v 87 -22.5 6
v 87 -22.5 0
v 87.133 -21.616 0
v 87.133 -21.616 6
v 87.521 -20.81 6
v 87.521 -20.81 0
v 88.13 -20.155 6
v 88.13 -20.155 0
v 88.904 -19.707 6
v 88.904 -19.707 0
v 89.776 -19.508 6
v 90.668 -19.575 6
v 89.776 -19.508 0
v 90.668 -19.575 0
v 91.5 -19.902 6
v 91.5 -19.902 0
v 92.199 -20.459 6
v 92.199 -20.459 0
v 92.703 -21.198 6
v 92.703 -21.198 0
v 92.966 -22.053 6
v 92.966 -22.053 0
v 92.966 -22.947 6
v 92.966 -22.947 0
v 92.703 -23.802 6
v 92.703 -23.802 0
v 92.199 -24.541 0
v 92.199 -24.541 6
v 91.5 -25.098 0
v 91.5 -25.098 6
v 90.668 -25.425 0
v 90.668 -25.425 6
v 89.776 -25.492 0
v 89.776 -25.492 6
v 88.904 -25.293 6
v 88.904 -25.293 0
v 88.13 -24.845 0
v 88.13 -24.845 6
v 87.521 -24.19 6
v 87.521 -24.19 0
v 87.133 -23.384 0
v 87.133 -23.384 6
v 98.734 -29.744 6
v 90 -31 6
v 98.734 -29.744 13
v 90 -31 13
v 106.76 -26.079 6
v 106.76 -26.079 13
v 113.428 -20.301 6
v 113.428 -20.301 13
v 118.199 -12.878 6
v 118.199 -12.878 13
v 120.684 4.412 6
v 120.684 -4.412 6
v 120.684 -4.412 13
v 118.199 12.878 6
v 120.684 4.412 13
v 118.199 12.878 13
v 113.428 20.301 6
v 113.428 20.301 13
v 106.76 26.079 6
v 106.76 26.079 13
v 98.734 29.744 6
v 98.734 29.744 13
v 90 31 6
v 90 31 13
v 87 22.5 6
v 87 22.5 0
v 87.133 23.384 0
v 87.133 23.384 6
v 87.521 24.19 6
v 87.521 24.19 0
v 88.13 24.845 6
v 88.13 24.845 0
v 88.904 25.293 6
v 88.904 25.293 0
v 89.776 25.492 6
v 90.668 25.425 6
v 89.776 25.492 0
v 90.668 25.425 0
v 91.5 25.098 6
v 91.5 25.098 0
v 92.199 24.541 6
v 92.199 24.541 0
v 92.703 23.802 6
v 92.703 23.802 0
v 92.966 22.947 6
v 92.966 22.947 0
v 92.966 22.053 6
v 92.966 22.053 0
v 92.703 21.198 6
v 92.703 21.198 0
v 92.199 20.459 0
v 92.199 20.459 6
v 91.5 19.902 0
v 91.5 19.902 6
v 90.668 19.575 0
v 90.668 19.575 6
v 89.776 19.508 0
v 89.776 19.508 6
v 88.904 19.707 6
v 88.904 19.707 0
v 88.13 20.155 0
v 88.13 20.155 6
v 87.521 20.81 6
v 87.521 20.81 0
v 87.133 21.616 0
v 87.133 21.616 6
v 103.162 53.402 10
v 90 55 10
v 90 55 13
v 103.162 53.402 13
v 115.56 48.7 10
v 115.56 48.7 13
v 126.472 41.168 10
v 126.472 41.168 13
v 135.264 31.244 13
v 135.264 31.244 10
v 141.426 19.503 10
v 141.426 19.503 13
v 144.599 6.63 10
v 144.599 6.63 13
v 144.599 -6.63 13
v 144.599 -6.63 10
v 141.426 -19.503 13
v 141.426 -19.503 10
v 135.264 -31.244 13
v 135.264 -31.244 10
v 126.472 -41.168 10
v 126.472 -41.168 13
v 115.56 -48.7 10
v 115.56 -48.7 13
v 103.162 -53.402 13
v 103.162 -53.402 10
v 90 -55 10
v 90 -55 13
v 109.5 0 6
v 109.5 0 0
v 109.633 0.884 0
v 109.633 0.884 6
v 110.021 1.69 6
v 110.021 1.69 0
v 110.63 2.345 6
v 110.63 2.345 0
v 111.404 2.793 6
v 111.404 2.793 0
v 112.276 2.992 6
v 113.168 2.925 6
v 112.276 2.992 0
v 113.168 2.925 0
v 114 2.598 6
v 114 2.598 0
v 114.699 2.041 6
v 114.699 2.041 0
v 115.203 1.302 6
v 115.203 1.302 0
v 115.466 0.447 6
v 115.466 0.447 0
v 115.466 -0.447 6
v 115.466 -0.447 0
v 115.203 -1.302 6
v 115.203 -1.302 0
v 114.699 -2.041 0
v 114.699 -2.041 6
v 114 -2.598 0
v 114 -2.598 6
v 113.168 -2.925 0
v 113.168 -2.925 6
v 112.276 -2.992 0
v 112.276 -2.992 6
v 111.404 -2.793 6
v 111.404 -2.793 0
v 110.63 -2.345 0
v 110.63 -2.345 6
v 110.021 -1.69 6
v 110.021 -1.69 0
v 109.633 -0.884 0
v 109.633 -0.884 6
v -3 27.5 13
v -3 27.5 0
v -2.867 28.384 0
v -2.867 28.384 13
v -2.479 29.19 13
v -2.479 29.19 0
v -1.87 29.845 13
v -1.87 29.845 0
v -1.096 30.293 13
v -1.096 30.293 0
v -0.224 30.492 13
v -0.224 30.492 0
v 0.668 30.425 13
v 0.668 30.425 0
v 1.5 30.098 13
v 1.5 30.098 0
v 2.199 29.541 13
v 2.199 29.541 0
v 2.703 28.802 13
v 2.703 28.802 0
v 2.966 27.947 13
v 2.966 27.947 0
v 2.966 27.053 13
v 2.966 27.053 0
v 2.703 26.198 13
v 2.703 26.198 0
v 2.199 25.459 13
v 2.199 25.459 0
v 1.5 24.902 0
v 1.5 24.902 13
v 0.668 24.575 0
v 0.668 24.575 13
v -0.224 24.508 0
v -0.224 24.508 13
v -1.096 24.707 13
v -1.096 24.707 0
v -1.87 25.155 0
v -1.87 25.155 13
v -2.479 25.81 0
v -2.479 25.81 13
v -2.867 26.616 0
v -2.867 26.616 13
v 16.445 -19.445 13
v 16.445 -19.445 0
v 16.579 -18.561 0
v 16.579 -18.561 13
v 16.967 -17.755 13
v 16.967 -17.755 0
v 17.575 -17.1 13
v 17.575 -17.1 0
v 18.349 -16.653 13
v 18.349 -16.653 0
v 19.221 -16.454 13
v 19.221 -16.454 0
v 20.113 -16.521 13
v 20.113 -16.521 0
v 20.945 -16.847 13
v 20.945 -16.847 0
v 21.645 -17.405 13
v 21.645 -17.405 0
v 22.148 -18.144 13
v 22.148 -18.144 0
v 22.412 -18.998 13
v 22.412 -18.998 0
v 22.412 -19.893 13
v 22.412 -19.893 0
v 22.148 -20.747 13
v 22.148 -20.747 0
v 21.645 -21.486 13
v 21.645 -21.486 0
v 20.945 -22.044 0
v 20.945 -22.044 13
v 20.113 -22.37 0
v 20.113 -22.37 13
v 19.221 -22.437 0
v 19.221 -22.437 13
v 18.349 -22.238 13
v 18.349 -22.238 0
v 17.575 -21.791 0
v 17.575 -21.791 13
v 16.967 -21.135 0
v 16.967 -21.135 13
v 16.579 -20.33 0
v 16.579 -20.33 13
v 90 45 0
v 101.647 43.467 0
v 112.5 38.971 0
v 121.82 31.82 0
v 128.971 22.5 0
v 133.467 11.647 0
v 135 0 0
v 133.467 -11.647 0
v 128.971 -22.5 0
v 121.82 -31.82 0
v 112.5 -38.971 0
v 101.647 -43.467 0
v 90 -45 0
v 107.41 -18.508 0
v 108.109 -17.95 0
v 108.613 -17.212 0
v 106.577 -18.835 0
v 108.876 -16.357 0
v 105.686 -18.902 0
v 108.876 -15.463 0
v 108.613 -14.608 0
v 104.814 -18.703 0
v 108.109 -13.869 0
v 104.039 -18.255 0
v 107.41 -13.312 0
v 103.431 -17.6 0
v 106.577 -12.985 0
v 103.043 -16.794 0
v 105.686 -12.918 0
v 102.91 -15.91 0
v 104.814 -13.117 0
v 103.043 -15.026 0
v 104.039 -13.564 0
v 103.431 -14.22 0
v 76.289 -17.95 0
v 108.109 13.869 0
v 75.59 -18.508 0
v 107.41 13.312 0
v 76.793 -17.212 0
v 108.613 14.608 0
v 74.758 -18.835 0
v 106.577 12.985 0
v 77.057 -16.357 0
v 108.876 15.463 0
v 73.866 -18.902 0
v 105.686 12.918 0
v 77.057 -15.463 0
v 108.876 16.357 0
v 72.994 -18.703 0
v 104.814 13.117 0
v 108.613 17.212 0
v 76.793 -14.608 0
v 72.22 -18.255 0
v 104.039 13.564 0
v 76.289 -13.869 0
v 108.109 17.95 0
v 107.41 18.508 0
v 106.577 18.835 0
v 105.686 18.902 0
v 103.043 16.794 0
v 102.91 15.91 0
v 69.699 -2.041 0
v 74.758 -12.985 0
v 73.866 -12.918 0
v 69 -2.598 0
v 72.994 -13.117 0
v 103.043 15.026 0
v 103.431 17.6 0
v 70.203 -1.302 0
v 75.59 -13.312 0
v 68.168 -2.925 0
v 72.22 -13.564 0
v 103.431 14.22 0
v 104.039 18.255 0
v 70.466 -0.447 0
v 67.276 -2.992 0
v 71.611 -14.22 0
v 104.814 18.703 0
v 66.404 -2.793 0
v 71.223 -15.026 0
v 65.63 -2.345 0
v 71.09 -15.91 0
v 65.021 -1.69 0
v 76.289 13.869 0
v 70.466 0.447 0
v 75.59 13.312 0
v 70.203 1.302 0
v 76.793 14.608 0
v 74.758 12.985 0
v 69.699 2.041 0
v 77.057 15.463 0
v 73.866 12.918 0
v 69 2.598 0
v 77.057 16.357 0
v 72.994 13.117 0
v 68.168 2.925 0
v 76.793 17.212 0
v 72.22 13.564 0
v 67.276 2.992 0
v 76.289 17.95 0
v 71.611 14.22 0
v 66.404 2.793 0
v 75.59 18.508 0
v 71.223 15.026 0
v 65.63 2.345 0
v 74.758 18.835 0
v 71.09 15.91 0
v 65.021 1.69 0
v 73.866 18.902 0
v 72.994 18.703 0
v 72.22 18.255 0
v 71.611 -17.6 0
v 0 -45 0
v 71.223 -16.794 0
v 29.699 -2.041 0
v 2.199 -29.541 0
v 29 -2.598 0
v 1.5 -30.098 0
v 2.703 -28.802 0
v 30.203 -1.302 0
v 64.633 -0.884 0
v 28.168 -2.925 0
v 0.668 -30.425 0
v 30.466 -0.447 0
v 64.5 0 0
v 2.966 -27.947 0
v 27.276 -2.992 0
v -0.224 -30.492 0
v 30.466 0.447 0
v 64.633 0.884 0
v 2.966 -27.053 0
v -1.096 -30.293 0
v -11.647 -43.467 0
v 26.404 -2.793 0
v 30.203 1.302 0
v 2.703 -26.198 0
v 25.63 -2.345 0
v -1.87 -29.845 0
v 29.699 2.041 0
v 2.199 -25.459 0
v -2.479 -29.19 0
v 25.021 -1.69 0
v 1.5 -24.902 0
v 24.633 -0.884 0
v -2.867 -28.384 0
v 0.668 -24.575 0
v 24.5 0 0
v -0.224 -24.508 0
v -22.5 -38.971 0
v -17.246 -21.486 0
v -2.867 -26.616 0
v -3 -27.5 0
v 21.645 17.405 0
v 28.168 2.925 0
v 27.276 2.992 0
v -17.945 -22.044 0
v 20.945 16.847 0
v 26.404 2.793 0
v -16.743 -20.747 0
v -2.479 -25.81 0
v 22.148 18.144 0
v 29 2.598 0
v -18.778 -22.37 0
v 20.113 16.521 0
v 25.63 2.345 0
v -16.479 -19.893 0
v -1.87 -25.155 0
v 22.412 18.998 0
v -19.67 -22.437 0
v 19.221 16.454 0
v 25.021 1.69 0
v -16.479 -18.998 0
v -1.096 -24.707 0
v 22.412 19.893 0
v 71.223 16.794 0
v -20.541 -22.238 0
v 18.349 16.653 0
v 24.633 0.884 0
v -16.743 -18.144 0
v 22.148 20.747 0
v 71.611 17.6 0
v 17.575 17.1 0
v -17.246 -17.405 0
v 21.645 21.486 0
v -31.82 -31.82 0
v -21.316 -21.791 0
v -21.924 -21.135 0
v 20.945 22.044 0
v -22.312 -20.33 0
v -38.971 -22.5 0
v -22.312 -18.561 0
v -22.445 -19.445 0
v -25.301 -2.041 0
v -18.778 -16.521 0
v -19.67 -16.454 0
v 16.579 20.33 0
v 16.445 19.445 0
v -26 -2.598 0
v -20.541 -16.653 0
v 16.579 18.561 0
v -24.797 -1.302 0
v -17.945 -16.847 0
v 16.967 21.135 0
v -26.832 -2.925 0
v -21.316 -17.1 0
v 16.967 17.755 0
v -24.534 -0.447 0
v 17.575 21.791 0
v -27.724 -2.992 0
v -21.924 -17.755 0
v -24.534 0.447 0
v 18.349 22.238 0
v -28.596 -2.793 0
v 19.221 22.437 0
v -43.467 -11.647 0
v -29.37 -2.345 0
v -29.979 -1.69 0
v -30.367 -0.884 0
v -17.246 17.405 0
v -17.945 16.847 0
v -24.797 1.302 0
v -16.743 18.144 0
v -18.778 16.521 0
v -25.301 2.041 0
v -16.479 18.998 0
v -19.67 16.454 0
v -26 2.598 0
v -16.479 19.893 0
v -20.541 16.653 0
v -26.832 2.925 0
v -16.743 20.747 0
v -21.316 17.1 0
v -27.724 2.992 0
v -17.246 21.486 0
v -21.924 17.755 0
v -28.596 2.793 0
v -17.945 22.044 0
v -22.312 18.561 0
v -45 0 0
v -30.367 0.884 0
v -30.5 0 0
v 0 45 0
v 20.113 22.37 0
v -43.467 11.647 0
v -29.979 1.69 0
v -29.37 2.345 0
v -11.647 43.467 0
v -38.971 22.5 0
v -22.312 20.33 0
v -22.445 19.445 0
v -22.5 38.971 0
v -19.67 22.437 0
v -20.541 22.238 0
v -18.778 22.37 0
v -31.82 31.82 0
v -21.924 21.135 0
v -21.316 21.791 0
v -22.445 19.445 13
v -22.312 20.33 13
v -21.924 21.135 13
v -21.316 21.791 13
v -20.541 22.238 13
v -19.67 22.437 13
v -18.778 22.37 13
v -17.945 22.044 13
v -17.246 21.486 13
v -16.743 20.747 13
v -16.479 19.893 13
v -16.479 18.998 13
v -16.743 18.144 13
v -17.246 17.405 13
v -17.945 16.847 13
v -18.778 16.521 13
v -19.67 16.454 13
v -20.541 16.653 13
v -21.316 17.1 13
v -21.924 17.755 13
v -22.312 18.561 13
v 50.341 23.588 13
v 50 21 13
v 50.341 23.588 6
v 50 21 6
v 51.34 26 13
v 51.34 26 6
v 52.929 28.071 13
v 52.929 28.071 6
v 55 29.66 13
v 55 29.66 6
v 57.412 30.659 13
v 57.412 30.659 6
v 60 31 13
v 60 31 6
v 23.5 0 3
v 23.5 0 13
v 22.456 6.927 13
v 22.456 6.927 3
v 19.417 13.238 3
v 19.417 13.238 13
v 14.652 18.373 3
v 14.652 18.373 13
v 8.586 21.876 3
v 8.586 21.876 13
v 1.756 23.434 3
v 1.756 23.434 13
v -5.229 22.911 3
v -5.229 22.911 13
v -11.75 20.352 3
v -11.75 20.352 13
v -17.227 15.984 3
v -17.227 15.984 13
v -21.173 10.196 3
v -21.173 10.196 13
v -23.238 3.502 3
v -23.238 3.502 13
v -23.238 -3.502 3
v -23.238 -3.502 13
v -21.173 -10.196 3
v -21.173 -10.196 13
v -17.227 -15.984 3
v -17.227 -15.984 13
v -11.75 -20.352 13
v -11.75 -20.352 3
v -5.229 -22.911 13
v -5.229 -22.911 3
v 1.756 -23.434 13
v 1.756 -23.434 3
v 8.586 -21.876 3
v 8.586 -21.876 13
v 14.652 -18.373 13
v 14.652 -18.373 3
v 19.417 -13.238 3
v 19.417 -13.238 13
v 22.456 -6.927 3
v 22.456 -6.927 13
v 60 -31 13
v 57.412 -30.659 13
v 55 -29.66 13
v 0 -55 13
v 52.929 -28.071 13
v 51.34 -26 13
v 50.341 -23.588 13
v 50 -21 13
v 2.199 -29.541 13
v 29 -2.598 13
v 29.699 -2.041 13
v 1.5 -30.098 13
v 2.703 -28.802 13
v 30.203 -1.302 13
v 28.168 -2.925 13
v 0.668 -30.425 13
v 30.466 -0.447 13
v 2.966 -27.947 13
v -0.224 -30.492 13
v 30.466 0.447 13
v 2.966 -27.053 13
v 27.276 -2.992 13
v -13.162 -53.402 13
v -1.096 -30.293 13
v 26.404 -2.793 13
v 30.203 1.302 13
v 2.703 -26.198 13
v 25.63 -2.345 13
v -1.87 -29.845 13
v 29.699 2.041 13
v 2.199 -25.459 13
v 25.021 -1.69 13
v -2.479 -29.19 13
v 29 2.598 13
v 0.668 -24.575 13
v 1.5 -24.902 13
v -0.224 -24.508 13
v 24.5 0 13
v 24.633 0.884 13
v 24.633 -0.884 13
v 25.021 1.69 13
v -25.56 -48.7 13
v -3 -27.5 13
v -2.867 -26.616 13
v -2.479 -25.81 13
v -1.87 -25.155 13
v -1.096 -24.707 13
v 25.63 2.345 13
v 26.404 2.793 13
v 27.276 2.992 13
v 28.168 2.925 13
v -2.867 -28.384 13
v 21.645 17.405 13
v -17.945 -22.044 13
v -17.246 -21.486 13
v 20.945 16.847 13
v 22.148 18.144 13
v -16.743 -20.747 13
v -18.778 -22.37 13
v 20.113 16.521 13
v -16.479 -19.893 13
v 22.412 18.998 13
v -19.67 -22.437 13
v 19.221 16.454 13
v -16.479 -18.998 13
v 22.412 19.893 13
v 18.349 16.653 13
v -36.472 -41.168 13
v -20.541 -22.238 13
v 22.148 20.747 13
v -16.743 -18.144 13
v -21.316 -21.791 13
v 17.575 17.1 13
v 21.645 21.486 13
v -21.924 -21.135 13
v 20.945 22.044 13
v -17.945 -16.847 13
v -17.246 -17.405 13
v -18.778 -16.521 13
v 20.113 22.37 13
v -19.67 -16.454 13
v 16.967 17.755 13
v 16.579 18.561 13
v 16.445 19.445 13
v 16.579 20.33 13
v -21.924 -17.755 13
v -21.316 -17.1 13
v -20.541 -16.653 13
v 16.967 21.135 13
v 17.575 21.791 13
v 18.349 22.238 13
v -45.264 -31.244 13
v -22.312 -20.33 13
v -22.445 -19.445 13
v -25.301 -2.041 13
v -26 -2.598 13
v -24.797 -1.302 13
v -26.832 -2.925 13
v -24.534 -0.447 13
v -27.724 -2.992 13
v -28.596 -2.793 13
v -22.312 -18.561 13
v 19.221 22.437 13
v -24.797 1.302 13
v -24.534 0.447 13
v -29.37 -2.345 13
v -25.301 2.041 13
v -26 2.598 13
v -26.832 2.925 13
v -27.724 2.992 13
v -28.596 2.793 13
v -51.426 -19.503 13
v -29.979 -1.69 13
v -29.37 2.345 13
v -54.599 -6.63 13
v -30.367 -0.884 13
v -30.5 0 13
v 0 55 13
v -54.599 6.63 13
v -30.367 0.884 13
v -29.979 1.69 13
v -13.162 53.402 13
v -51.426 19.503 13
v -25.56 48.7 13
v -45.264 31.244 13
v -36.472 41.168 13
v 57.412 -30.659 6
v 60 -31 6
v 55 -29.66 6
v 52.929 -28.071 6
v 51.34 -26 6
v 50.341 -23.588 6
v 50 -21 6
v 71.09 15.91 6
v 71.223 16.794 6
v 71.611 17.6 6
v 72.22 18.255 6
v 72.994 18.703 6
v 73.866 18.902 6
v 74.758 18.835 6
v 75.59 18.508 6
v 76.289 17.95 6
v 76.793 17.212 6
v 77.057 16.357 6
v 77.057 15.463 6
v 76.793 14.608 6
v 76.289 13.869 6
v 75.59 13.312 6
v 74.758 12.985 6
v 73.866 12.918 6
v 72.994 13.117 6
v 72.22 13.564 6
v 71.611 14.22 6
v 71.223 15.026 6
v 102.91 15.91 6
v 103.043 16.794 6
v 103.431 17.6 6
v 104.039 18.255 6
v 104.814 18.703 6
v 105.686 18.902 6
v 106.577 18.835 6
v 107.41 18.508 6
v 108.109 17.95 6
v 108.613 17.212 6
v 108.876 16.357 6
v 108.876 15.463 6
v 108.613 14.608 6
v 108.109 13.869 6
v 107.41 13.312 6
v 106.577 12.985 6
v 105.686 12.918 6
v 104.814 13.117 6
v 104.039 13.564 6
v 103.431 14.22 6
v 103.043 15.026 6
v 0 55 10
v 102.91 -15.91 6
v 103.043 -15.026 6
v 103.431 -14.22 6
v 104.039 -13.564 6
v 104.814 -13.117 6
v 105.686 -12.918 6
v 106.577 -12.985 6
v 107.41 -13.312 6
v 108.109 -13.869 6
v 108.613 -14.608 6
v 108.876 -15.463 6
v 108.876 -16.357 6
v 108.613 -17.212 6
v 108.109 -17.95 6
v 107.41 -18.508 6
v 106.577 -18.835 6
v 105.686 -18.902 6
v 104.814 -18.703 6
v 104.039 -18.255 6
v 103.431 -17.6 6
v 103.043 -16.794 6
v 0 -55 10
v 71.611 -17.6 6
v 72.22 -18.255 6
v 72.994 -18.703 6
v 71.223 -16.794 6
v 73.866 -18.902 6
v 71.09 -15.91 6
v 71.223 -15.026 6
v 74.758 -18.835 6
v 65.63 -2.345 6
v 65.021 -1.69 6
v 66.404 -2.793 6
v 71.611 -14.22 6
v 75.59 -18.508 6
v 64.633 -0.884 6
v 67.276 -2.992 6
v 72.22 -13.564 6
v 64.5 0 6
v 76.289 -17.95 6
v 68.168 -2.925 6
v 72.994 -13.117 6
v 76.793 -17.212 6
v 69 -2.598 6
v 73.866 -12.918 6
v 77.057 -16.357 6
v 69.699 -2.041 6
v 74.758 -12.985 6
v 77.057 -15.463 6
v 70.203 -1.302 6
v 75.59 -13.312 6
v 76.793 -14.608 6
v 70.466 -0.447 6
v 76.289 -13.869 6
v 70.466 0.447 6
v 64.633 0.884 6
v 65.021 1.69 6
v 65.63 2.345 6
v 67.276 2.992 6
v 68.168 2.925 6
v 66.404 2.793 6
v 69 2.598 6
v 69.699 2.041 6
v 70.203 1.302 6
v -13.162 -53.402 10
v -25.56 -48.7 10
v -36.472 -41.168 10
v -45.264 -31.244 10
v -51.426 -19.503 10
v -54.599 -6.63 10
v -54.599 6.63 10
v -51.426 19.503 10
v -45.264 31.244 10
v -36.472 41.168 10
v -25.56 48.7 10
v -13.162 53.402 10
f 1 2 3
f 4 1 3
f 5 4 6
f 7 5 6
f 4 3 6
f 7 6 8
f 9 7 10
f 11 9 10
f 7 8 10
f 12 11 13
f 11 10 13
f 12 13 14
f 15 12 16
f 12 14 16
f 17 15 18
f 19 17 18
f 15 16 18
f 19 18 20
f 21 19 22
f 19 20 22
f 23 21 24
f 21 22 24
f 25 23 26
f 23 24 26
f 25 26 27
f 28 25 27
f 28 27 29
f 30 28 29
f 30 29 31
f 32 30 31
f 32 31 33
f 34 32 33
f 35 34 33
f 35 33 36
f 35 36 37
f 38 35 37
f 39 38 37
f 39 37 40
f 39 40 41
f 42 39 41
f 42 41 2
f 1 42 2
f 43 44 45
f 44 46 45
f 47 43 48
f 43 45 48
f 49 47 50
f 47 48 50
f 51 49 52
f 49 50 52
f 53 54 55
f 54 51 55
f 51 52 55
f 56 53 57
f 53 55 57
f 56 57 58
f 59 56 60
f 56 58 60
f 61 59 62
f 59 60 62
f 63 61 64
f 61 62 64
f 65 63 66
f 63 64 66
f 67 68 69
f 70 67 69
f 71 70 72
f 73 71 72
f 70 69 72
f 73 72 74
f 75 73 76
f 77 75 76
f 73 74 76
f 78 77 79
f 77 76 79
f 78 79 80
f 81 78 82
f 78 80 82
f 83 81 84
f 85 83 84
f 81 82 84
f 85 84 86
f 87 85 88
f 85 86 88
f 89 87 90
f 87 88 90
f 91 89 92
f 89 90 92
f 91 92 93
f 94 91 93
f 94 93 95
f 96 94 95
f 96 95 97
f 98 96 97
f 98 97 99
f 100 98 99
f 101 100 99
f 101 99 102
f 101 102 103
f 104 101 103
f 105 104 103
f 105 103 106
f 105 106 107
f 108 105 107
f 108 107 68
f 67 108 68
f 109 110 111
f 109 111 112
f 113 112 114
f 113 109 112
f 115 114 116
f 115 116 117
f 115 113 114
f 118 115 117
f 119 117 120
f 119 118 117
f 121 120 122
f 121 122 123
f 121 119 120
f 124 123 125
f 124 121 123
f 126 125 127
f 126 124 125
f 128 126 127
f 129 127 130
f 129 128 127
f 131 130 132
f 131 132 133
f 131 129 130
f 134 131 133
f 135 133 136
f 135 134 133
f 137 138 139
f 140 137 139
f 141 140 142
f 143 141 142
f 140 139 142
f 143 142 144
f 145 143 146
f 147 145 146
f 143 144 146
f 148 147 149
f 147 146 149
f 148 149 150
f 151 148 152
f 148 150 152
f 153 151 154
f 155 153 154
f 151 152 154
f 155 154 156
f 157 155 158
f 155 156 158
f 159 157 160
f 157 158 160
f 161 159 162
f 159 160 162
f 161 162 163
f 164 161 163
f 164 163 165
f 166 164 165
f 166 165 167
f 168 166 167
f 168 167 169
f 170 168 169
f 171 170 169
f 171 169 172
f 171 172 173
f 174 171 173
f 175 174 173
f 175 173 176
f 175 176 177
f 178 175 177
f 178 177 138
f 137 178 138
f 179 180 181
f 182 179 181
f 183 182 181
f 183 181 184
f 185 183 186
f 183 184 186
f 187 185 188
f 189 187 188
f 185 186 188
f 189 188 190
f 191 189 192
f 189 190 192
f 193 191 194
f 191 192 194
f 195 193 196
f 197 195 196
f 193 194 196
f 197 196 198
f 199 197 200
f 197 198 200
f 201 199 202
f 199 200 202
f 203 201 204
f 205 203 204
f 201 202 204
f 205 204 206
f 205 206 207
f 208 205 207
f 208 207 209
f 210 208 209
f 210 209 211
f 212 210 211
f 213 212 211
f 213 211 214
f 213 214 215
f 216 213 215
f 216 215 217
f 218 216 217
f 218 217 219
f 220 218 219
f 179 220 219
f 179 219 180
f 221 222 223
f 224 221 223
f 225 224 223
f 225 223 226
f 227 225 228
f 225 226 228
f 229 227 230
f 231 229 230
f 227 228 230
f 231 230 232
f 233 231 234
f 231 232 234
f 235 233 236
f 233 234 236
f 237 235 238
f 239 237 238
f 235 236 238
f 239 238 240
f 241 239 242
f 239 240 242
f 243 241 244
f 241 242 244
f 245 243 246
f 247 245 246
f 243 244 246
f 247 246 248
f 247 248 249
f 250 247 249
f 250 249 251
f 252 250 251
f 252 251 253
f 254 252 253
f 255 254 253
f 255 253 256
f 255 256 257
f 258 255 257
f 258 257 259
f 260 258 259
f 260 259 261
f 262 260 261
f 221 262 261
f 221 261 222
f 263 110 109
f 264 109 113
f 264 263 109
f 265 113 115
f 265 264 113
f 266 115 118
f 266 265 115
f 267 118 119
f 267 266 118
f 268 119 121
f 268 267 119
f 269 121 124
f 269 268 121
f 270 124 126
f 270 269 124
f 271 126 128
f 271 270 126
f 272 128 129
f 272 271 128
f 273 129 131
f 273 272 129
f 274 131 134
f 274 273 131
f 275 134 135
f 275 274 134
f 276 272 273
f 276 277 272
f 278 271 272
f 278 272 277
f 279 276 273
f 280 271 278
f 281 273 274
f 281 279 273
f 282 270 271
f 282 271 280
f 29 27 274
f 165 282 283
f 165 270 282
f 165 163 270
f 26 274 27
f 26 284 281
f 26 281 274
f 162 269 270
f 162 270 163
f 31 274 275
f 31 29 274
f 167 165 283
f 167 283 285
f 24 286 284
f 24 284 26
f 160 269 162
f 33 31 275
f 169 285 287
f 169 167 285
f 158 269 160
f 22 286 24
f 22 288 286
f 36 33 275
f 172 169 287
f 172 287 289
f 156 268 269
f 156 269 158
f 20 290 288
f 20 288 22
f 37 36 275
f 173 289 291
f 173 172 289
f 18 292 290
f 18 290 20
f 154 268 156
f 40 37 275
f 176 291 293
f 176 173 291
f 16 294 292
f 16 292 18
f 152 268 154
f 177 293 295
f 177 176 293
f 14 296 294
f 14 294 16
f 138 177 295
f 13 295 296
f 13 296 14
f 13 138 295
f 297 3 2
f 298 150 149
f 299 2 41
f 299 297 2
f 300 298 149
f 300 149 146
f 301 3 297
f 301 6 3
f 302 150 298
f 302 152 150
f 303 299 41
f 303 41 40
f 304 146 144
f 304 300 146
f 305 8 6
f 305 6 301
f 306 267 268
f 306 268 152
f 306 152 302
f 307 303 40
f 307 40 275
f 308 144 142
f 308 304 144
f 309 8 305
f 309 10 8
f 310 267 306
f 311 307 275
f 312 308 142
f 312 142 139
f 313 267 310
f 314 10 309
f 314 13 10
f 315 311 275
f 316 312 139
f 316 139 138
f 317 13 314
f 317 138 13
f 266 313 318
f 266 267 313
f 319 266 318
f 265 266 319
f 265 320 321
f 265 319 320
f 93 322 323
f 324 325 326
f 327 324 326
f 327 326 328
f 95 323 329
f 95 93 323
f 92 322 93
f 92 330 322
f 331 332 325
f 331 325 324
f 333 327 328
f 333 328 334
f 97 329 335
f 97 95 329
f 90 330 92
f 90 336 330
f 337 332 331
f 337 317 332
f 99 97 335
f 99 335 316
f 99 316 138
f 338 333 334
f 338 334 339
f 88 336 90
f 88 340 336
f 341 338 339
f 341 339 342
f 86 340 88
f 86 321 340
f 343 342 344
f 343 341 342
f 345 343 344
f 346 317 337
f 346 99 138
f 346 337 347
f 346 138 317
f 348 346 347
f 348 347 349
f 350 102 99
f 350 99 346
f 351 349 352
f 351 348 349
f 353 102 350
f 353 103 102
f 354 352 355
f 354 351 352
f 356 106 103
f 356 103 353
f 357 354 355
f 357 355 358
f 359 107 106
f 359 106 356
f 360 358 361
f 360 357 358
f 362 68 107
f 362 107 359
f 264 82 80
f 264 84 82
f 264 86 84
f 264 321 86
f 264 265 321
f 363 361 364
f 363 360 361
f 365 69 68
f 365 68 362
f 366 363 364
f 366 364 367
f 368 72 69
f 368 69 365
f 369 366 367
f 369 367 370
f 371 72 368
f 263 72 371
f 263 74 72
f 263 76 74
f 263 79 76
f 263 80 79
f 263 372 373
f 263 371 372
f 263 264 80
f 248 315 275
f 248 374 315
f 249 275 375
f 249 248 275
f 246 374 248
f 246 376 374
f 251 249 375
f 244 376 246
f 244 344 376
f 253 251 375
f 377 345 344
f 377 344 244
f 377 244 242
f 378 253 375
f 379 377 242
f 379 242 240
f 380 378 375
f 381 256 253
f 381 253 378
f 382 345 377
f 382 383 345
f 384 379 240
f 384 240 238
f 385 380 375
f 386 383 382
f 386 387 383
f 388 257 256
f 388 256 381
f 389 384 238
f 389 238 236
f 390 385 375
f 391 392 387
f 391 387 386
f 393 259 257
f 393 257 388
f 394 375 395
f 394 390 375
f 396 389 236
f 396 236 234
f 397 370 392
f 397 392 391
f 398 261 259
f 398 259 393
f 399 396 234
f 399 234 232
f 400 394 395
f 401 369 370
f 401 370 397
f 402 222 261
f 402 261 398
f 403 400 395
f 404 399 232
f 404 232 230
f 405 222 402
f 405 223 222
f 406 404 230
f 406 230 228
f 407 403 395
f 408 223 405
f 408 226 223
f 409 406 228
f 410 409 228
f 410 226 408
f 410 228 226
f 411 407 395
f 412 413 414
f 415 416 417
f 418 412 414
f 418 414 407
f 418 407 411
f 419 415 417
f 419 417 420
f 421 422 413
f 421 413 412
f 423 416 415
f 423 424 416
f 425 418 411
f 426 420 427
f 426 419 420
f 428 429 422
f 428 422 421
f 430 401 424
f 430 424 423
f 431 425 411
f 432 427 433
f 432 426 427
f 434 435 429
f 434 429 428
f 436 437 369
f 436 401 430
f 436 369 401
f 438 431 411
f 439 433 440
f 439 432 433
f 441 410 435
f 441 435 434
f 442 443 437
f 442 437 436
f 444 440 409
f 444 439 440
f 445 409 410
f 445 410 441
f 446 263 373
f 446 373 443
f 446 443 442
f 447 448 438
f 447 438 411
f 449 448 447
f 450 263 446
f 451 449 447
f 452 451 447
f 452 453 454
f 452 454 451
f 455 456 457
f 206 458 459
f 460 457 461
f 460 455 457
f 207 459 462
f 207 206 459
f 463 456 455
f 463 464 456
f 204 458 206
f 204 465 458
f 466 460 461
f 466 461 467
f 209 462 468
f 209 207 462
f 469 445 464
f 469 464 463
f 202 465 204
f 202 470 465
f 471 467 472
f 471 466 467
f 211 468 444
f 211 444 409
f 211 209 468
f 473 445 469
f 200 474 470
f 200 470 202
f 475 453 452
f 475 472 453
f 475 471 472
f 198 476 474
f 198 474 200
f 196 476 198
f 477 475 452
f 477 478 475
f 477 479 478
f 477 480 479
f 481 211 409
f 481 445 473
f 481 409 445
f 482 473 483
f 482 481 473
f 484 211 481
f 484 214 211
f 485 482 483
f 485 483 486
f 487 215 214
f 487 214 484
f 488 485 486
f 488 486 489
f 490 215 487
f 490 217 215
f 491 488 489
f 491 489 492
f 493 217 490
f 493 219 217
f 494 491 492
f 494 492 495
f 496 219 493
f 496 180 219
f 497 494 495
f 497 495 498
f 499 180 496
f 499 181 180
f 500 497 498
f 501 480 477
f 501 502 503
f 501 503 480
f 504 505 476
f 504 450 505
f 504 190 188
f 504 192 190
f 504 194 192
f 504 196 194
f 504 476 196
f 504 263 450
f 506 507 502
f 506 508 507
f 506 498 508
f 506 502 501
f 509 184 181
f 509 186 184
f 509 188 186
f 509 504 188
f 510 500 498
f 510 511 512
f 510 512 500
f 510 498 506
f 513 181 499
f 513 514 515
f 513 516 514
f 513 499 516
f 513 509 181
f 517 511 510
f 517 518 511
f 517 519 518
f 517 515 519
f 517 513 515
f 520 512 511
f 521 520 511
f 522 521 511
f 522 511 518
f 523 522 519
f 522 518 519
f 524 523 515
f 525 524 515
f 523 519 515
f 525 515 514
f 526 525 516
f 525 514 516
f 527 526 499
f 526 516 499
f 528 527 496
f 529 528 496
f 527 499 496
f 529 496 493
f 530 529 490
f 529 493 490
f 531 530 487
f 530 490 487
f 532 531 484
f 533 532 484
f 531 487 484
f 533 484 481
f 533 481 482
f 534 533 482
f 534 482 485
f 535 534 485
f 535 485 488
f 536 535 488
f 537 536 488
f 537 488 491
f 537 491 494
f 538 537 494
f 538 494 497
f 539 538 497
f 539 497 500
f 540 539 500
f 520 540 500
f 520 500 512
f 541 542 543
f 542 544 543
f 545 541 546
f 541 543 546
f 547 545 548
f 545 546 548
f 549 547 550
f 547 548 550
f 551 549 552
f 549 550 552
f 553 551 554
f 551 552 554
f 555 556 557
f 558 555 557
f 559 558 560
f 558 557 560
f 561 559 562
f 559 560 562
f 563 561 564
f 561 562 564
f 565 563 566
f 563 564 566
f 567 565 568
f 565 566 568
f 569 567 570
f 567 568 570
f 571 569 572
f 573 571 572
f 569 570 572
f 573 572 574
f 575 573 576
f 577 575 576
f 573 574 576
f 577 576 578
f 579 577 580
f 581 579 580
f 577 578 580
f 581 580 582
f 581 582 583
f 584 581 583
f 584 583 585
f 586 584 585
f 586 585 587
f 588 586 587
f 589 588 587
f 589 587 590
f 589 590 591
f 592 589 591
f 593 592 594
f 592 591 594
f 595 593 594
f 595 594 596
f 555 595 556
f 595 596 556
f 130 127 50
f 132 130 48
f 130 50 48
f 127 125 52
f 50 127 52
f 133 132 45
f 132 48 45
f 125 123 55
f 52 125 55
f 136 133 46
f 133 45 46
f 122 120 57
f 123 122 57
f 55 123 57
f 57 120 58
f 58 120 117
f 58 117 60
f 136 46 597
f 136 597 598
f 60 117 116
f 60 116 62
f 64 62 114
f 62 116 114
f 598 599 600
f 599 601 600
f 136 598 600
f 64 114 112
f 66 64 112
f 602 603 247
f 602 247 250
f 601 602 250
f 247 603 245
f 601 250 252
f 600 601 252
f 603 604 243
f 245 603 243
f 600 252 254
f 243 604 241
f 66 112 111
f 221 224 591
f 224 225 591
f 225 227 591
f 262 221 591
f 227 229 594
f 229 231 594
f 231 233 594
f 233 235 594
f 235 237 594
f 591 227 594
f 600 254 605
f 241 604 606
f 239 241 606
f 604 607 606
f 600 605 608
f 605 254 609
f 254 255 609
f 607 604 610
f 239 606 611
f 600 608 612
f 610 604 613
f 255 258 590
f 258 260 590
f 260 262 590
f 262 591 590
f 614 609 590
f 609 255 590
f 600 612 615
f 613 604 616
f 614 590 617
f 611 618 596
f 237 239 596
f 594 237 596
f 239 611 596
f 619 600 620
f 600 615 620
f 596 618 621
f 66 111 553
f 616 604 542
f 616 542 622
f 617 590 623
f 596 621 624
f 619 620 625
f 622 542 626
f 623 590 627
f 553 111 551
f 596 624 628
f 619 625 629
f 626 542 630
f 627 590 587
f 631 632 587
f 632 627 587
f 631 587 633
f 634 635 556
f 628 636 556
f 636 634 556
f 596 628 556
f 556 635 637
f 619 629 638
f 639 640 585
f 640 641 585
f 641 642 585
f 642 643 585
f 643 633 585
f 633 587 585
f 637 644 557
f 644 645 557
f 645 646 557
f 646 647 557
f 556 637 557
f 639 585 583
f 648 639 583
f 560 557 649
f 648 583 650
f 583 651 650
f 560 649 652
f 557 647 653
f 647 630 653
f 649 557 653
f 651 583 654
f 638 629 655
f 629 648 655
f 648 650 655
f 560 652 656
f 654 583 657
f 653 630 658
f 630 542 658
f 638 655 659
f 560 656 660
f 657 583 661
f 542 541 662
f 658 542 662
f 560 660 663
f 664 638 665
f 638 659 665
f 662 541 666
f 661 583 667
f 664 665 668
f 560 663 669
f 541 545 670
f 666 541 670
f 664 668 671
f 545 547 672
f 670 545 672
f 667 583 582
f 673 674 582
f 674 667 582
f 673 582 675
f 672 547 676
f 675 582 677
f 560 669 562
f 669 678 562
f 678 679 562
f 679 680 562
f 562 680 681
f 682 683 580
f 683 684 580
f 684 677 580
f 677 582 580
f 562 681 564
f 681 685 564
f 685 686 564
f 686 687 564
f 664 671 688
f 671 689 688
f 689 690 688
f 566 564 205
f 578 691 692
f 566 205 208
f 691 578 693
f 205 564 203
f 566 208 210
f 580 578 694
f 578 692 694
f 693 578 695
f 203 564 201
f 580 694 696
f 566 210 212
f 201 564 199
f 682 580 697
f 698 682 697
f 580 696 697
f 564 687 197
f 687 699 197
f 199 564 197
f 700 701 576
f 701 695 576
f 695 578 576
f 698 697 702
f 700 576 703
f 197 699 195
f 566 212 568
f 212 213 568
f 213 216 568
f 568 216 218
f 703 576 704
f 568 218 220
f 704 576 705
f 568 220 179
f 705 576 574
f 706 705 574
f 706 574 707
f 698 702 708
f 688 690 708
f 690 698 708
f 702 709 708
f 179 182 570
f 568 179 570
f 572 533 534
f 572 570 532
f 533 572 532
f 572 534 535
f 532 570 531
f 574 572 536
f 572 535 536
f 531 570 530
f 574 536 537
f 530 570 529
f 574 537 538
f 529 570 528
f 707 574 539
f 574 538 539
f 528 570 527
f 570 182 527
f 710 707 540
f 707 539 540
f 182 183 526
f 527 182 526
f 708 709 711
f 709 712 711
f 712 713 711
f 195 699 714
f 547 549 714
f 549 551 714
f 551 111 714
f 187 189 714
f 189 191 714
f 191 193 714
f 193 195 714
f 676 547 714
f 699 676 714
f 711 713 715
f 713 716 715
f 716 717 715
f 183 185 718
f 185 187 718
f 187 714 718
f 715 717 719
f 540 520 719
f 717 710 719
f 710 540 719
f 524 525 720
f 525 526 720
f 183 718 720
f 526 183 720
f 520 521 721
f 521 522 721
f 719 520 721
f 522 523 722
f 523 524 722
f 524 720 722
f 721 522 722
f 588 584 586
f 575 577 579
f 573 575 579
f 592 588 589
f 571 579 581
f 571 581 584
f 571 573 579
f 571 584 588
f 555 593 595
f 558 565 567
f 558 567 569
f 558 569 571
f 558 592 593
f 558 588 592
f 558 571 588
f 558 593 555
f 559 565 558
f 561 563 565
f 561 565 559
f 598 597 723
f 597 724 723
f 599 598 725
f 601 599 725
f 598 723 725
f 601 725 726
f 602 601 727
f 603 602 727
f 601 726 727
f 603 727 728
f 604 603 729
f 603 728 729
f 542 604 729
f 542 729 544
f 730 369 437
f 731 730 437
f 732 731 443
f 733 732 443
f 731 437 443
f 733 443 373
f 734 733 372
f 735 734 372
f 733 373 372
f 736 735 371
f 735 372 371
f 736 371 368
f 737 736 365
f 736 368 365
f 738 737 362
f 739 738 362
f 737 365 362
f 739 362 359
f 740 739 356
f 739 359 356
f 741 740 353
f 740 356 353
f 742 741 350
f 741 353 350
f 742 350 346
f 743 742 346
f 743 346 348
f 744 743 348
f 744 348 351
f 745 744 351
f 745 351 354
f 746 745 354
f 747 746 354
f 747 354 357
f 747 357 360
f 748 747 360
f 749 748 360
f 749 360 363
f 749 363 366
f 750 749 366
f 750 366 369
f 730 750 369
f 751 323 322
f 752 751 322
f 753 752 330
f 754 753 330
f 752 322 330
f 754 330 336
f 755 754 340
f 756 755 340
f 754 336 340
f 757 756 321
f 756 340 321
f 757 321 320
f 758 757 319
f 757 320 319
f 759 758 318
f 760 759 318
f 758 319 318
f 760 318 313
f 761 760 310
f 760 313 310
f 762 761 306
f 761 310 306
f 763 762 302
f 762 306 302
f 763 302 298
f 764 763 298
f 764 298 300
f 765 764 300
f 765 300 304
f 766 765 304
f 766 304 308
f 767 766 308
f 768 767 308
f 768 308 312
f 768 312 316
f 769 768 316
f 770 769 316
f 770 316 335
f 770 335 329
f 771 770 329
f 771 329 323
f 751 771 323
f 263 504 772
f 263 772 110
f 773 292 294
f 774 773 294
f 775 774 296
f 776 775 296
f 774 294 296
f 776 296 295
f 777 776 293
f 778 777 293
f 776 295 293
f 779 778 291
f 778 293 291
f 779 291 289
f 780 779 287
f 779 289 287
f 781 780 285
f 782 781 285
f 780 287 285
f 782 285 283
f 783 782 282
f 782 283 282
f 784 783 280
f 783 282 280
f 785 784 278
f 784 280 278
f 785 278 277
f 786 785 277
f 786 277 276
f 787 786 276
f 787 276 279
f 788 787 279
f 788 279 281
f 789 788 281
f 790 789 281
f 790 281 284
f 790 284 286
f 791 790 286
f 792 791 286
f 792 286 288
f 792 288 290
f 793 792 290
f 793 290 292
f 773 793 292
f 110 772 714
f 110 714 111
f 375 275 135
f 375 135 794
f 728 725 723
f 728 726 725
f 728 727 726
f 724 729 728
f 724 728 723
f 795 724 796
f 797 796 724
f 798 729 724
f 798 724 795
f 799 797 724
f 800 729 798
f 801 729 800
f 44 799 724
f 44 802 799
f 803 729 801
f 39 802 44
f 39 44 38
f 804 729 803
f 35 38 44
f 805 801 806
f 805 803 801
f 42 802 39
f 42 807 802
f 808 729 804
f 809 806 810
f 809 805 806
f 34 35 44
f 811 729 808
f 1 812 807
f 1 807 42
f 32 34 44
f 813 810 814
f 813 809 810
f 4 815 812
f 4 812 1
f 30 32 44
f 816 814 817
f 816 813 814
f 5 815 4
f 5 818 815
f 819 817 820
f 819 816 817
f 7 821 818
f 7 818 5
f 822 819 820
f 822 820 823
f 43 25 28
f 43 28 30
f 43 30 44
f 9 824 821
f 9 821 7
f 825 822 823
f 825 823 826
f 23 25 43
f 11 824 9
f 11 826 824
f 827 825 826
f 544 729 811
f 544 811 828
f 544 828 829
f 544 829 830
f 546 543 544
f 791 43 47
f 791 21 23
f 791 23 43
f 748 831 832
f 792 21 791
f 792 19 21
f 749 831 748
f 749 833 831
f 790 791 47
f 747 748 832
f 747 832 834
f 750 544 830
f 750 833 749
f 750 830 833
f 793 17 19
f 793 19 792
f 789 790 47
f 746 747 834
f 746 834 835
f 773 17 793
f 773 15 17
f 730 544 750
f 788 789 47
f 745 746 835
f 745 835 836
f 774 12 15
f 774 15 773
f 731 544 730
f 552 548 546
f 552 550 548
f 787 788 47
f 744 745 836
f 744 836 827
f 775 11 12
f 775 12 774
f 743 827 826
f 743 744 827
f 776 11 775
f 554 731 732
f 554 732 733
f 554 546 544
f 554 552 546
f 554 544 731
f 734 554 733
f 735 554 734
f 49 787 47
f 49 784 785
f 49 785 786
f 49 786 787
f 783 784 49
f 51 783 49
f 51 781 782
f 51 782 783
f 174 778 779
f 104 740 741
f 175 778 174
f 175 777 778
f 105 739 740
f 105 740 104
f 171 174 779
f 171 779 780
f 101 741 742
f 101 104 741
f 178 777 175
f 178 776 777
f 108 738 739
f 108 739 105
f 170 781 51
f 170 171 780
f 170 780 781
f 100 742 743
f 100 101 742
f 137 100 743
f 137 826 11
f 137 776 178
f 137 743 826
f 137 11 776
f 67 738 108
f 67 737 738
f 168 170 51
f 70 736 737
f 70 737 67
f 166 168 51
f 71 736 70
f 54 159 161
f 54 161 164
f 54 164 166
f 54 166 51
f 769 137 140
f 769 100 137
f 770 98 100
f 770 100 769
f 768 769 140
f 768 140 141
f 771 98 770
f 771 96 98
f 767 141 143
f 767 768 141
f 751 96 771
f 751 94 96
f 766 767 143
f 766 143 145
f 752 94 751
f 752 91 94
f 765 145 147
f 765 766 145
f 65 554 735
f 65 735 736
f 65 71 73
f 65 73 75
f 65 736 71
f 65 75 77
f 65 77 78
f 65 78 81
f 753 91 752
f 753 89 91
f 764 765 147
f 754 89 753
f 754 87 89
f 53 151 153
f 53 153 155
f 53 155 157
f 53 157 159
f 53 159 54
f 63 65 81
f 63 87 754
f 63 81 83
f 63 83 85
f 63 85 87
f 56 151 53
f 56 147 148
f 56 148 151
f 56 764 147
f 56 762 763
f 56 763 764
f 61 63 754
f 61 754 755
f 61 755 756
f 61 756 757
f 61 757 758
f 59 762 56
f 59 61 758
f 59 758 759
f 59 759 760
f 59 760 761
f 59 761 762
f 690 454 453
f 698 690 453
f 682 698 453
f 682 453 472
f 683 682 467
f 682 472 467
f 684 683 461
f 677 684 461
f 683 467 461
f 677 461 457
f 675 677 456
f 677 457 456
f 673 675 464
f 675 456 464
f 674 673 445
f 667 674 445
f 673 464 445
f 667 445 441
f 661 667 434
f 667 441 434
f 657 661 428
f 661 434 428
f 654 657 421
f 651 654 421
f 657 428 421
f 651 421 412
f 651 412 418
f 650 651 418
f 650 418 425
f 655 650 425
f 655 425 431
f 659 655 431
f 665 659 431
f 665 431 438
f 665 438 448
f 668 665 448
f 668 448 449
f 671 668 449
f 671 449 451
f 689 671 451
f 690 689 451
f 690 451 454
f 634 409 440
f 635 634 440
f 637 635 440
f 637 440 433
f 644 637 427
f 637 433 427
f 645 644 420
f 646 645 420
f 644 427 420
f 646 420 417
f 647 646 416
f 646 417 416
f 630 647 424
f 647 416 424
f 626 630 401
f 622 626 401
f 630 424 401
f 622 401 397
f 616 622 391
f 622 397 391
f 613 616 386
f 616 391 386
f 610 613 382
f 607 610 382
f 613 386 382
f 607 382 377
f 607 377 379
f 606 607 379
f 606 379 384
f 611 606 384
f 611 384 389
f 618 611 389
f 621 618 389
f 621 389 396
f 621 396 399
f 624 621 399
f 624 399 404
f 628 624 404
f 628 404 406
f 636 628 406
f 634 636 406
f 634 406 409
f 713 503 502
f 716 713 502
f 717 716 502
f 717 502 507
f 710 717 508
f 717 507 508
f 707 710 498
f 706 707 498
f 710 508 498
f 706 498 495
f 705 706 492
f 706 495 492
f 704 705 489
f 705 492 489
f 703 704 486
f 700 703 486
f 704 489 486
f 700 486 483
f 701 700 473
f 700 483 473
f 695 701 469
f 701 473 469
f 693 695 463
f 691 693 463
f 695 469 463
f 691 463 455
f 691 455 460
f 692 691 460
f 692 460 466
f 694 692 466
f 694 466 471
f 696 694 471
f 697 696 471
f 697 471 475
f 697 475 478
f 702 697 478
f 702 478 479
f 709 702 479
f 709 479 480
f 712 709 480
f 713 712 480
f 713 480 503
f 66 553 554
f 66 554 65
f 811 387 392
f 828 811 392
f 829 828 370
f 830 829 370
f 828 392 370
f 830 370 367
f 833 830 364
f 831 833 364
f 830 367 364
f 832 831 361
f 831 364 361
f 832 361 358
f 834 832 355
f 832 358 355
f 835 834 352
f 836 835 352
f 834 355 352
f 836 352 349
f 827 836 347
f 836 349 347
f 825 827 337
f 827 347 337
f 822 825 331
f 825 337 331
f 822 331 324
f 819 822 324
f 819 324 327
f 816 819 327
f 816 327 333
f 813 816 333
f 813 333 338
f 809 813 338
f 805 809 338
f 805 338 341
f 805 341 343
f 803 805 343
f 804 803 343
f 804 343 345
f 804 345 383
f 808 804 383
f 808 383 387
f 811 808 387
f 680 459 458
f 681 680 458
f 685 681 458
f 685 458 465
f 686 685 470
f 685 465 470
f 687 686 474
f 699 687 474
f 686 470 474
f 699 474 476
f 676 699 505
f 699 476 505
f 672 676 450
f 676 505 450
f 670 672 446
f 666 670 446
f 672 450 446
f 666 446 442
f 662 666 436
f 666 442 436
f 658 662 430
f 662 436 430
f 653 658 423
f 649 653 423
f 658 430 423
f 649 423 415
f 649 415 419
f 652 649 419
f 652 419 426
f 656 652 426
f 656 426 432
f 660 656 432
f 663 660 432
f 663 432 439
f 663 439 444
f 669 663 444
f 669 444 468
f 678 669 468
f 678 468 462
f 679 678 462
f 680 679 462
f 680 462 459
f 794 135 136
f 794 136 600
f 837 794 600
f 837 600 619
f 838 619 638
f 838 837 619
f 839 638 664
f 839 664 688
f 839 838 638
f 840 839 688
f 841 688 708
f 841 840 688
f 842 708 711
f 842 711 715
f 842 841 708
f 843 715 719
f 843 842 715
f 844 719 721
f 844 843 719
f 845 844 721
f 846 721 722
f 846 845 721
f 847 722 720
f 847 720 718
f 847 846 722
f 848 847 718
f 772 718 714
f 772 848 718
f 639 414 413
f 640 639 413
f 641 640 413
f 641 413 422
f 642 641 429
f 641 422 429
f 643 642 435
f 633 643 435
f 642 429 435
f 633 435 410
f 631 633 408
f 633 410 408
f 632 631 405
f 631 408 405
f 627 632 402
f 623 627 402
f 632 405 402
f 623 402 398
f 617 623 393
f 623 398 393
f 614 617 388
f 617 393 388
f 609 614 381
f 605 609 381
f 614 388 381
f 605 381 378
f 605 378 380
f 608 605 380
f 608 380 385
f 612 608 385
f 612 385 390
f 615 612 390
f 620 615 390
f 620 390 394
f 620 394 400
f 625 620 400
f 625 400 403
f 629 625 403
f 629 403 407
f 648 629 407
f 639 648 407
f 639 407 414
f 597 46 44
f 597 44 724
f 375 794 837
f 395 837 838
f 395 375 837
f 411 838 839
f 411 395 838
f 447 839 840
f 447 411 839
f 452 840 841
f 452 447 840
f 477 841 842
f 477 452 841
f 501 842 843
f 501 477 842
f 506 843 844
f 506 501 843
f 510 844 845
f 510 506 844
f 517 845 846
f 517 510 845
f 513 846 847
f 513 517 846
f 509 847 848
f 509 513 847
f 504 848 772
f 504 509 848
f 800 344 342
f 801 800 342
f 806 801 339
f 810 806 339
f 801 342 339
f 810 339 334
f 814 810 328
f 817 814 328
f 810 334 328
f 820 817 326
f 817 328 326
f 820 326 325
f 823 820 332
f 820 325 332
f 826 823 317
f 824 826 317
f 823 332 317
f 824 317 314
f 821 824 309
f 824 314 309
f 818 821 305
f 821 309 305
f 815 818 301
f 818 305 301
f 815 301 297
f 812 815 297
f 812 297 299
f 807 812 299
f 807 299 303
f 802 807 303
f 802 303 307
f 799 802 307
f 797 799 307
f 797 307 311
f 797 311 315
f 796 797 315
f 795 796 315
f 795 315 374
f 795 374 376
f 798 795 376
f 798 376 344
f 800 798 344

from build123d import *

# Parameters (mm, degrees)
EXTRUDE_1_DEPTH     = 13
SKETCH_2_R          = 31
CUT_EXTRUDE_3_DEPTH = 7
SKETCH_4_R          = 3
CUT_EXTRUDE_4_DEPTH = 31
CHAMFER_1_SIZE      = 10
CUT_EXTRUDE_5_DEPTH = 7
SKETCH_7_R          = 3
CUT_EXTRUDE_7_DEPTH = 80
FILLET_1_R          = 10
SKETCH_8_R          = 23.5
CUT_EXTRUDE_8_DEPTH = 10


with BuildPart() as part:
    # 草图1 → 拉伸1 (new body)
    with BuildSketch(Plane.XY):
        with BuildLine():
            Line((0, 55), (90, 55))
            ThreePointArc((90, 55), (145, 0), (90, -55))
            Line((90, -55), (0, -55))
            ThreePointArc((0, -55), (-55, 0), (0, 55))
        make_face()
    extrude(amount=EXTRUDE_1_DEPTH)

    # 草图2 → 切除-拉伸3 (cut)
    with BuildSketch(Plane.XY.offset(13)):
        with Locations((90, 0)):
            Circle(SKETCH_2_R)
    extrude(amount=-CUT_EXTRUDE_3_DEPTH, mode=Mode.SUBTRACT)

    # 草图4 → 切除-拉伸4 (cut)
    with BuildSketch(Plane(origin=(0, 0, 0), x_dir=(-1, 0, 0), z_dir=(0, 0, -1))):
        with Locations((-90, 22.5)):
            Circle(SKETCH_4_R)
        with Locations((-74.090097423, 15.909902577)):
            Circle(SKETCH_4_R)
        with Locations((-67.5, 0)):
            Circle(SKETCH_4_R)
        with Locations((-74.090097423, -15.909902577)):
            Circle(SKETCH_4_R)
        with Locations((-90, -22.5)):
            Circle(SKETCH_4_R)
        with Locations((-105.909902577, -15.909902577)):
            Circle(SKETCH_4_R)
        with Locations((-112.5, 0)):
            Circle(SKETCH_4_R)
        with Locations((-105.909902577, 15.909902577)):
            Circle(SKETCH_4_R)
    extrude(amount=-CUT_EXTRUDE_4_DEPTH, mode=Mode.SUBTRACT)

    # 倒角1
    chamfer_1_edges = [part.edges().sort_by_distance(p)[0] for p in [
        (45, 55, 0),
        (145, 0, 0),
        (45, -55, 0),
        (-55, 0, 0),
    ]]
    chamfer(chamfer_1_edges, length=CHAMFER_1_SIZE)

    # 草图5 → 切除-拉伸5 (cut)
    with BuildSketch(Plane.XY.offset(13)):
        with BuildLine():
            Line((50, 31), (90, 31))
            ThreePointArc((90, 31), (121, 0), (90, -31))
            Line((90, -31), (50, -31))
            Line((50, -31), (50, 31))
        make_face()
    extrude(amount=-CUT_EXTRUDE_5_DEPTH, mode=Mode.SUBTRACT)

    # 草图7 → 切除-拉伸7 (cut)
    with BuildSketch(Plane(origin=(0, 0, 0), x_dir=(-1, 0, 0), z_dir=(0, 0, -1))):
        with Locations((19.445436483, 19.445436483)):
            Circle(SKETCH_7_R)
        with Locations((27.5, 0)):
            Circle(SKETCH_7_R)
        with Locations((19.445436483, -19.445436483)):
            Circle(SKETCH_7_R)
        with Locations((0, -27.5)):
            Circle(SKETCH_7_R)
        with Locations((0, 27.5)):
            Circle(SKETCH_7_R)
        with Locations((-19.445436483, -19.445436483)):
            Circle(SKETCH_7_R)
        with Locations((-27.5, 0)):
            Circle(SKETCH_7_R)
        with Locations((-19.445436483, 19.445436483)):
            Circle(SKETCH_7_R)
    extrude(amount=-CUT_EXTRUDE_7_DEPTH, mode=Mode.SUBTRACT)

    # 圆角1
    fillet_1_edges = [part.edges().sort_by_distance(p)[0] for p in [
        (50, -31, 9.5),
        (50, 31, 9.5),
    ]]
    fillet(fillet_1_edges, radius=FILLET_1_R)

    # 草图8 → 切除-拉伸8 (cut)
    with BuildSketch(Plane.XY.offset(13)):
        Circle(SKETCH_8_R)
    extrude(amount=-CUT_EXTRUDE_8_DEPTH, mode=Mode.SUBTRACT)


solid = part.part
